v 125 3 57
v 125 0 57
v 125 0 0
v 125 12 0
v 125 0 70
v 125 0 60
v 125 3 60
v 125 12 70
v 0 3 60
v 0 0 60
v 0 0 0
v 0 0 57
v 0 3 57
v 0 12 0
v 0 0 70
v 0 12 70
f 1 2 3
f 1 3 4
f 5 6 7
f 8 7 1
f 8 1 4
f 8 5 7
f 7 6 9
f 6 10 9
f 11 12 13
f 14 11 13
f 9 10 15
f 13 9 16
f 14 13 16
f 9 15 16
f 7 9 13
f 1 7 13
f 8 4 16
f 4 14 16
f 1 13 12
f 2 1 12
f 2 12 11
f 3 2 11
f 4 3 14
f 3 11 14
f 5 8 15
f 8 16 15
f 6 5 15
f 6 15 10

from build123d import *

# Parameters (mm, degrees)
F1_DEPTH = 25
F2_DEPTH = 25
F3_DEPTH = 25
F4_DEPTH = 25
F5_DEPTH = 25


with BuildPart() as f1:
    # F0 (on Right) → F1 (new body)
    with BuildSketch(Plane.YZ):
        Polygon((0, 57), (0, 0), (12, 0), (12, 70), (0, 70), (0, 60), (3, 60), (3, 57), align=None)
    extrude(amount=F1_DEPTH)

    # F2 (add): a face of the model
    f2_faces = [f1.faces().sort_by_distance(p)[0] for p in [
        (25, 6.0487364621, 34.7454873646),
    ]]
    extrude(f2_faces, amount=F2_DEPTH)

    # F3 (add): a face of the model
    f3_faces = [f1.faces().sort_by_distance(p)[0] for p in [
        (50, 6.0487364621, 34.7454873646),
    ]]
    extrude(f3_faces, amount=F3_DEPTH)

    # F4 (add): a face of the model
    f4_faces = [f1.faces().sort_by_distance(p)[0] for p in [
        (75, 6.0487364621, 34.7454873646),
    ]]
    extrude(f4_faces, amount=F4_DEPTH)

    # F5 (add): a face of the model
    f5_faces = [f1.faces().sort_by_distance(p)[0] for p in [
        (100, 6.0487364621, 34.7454873646),
    ]]
    extrude(f5_faces, amount=F5_DEPTH)


solid = f1.part
